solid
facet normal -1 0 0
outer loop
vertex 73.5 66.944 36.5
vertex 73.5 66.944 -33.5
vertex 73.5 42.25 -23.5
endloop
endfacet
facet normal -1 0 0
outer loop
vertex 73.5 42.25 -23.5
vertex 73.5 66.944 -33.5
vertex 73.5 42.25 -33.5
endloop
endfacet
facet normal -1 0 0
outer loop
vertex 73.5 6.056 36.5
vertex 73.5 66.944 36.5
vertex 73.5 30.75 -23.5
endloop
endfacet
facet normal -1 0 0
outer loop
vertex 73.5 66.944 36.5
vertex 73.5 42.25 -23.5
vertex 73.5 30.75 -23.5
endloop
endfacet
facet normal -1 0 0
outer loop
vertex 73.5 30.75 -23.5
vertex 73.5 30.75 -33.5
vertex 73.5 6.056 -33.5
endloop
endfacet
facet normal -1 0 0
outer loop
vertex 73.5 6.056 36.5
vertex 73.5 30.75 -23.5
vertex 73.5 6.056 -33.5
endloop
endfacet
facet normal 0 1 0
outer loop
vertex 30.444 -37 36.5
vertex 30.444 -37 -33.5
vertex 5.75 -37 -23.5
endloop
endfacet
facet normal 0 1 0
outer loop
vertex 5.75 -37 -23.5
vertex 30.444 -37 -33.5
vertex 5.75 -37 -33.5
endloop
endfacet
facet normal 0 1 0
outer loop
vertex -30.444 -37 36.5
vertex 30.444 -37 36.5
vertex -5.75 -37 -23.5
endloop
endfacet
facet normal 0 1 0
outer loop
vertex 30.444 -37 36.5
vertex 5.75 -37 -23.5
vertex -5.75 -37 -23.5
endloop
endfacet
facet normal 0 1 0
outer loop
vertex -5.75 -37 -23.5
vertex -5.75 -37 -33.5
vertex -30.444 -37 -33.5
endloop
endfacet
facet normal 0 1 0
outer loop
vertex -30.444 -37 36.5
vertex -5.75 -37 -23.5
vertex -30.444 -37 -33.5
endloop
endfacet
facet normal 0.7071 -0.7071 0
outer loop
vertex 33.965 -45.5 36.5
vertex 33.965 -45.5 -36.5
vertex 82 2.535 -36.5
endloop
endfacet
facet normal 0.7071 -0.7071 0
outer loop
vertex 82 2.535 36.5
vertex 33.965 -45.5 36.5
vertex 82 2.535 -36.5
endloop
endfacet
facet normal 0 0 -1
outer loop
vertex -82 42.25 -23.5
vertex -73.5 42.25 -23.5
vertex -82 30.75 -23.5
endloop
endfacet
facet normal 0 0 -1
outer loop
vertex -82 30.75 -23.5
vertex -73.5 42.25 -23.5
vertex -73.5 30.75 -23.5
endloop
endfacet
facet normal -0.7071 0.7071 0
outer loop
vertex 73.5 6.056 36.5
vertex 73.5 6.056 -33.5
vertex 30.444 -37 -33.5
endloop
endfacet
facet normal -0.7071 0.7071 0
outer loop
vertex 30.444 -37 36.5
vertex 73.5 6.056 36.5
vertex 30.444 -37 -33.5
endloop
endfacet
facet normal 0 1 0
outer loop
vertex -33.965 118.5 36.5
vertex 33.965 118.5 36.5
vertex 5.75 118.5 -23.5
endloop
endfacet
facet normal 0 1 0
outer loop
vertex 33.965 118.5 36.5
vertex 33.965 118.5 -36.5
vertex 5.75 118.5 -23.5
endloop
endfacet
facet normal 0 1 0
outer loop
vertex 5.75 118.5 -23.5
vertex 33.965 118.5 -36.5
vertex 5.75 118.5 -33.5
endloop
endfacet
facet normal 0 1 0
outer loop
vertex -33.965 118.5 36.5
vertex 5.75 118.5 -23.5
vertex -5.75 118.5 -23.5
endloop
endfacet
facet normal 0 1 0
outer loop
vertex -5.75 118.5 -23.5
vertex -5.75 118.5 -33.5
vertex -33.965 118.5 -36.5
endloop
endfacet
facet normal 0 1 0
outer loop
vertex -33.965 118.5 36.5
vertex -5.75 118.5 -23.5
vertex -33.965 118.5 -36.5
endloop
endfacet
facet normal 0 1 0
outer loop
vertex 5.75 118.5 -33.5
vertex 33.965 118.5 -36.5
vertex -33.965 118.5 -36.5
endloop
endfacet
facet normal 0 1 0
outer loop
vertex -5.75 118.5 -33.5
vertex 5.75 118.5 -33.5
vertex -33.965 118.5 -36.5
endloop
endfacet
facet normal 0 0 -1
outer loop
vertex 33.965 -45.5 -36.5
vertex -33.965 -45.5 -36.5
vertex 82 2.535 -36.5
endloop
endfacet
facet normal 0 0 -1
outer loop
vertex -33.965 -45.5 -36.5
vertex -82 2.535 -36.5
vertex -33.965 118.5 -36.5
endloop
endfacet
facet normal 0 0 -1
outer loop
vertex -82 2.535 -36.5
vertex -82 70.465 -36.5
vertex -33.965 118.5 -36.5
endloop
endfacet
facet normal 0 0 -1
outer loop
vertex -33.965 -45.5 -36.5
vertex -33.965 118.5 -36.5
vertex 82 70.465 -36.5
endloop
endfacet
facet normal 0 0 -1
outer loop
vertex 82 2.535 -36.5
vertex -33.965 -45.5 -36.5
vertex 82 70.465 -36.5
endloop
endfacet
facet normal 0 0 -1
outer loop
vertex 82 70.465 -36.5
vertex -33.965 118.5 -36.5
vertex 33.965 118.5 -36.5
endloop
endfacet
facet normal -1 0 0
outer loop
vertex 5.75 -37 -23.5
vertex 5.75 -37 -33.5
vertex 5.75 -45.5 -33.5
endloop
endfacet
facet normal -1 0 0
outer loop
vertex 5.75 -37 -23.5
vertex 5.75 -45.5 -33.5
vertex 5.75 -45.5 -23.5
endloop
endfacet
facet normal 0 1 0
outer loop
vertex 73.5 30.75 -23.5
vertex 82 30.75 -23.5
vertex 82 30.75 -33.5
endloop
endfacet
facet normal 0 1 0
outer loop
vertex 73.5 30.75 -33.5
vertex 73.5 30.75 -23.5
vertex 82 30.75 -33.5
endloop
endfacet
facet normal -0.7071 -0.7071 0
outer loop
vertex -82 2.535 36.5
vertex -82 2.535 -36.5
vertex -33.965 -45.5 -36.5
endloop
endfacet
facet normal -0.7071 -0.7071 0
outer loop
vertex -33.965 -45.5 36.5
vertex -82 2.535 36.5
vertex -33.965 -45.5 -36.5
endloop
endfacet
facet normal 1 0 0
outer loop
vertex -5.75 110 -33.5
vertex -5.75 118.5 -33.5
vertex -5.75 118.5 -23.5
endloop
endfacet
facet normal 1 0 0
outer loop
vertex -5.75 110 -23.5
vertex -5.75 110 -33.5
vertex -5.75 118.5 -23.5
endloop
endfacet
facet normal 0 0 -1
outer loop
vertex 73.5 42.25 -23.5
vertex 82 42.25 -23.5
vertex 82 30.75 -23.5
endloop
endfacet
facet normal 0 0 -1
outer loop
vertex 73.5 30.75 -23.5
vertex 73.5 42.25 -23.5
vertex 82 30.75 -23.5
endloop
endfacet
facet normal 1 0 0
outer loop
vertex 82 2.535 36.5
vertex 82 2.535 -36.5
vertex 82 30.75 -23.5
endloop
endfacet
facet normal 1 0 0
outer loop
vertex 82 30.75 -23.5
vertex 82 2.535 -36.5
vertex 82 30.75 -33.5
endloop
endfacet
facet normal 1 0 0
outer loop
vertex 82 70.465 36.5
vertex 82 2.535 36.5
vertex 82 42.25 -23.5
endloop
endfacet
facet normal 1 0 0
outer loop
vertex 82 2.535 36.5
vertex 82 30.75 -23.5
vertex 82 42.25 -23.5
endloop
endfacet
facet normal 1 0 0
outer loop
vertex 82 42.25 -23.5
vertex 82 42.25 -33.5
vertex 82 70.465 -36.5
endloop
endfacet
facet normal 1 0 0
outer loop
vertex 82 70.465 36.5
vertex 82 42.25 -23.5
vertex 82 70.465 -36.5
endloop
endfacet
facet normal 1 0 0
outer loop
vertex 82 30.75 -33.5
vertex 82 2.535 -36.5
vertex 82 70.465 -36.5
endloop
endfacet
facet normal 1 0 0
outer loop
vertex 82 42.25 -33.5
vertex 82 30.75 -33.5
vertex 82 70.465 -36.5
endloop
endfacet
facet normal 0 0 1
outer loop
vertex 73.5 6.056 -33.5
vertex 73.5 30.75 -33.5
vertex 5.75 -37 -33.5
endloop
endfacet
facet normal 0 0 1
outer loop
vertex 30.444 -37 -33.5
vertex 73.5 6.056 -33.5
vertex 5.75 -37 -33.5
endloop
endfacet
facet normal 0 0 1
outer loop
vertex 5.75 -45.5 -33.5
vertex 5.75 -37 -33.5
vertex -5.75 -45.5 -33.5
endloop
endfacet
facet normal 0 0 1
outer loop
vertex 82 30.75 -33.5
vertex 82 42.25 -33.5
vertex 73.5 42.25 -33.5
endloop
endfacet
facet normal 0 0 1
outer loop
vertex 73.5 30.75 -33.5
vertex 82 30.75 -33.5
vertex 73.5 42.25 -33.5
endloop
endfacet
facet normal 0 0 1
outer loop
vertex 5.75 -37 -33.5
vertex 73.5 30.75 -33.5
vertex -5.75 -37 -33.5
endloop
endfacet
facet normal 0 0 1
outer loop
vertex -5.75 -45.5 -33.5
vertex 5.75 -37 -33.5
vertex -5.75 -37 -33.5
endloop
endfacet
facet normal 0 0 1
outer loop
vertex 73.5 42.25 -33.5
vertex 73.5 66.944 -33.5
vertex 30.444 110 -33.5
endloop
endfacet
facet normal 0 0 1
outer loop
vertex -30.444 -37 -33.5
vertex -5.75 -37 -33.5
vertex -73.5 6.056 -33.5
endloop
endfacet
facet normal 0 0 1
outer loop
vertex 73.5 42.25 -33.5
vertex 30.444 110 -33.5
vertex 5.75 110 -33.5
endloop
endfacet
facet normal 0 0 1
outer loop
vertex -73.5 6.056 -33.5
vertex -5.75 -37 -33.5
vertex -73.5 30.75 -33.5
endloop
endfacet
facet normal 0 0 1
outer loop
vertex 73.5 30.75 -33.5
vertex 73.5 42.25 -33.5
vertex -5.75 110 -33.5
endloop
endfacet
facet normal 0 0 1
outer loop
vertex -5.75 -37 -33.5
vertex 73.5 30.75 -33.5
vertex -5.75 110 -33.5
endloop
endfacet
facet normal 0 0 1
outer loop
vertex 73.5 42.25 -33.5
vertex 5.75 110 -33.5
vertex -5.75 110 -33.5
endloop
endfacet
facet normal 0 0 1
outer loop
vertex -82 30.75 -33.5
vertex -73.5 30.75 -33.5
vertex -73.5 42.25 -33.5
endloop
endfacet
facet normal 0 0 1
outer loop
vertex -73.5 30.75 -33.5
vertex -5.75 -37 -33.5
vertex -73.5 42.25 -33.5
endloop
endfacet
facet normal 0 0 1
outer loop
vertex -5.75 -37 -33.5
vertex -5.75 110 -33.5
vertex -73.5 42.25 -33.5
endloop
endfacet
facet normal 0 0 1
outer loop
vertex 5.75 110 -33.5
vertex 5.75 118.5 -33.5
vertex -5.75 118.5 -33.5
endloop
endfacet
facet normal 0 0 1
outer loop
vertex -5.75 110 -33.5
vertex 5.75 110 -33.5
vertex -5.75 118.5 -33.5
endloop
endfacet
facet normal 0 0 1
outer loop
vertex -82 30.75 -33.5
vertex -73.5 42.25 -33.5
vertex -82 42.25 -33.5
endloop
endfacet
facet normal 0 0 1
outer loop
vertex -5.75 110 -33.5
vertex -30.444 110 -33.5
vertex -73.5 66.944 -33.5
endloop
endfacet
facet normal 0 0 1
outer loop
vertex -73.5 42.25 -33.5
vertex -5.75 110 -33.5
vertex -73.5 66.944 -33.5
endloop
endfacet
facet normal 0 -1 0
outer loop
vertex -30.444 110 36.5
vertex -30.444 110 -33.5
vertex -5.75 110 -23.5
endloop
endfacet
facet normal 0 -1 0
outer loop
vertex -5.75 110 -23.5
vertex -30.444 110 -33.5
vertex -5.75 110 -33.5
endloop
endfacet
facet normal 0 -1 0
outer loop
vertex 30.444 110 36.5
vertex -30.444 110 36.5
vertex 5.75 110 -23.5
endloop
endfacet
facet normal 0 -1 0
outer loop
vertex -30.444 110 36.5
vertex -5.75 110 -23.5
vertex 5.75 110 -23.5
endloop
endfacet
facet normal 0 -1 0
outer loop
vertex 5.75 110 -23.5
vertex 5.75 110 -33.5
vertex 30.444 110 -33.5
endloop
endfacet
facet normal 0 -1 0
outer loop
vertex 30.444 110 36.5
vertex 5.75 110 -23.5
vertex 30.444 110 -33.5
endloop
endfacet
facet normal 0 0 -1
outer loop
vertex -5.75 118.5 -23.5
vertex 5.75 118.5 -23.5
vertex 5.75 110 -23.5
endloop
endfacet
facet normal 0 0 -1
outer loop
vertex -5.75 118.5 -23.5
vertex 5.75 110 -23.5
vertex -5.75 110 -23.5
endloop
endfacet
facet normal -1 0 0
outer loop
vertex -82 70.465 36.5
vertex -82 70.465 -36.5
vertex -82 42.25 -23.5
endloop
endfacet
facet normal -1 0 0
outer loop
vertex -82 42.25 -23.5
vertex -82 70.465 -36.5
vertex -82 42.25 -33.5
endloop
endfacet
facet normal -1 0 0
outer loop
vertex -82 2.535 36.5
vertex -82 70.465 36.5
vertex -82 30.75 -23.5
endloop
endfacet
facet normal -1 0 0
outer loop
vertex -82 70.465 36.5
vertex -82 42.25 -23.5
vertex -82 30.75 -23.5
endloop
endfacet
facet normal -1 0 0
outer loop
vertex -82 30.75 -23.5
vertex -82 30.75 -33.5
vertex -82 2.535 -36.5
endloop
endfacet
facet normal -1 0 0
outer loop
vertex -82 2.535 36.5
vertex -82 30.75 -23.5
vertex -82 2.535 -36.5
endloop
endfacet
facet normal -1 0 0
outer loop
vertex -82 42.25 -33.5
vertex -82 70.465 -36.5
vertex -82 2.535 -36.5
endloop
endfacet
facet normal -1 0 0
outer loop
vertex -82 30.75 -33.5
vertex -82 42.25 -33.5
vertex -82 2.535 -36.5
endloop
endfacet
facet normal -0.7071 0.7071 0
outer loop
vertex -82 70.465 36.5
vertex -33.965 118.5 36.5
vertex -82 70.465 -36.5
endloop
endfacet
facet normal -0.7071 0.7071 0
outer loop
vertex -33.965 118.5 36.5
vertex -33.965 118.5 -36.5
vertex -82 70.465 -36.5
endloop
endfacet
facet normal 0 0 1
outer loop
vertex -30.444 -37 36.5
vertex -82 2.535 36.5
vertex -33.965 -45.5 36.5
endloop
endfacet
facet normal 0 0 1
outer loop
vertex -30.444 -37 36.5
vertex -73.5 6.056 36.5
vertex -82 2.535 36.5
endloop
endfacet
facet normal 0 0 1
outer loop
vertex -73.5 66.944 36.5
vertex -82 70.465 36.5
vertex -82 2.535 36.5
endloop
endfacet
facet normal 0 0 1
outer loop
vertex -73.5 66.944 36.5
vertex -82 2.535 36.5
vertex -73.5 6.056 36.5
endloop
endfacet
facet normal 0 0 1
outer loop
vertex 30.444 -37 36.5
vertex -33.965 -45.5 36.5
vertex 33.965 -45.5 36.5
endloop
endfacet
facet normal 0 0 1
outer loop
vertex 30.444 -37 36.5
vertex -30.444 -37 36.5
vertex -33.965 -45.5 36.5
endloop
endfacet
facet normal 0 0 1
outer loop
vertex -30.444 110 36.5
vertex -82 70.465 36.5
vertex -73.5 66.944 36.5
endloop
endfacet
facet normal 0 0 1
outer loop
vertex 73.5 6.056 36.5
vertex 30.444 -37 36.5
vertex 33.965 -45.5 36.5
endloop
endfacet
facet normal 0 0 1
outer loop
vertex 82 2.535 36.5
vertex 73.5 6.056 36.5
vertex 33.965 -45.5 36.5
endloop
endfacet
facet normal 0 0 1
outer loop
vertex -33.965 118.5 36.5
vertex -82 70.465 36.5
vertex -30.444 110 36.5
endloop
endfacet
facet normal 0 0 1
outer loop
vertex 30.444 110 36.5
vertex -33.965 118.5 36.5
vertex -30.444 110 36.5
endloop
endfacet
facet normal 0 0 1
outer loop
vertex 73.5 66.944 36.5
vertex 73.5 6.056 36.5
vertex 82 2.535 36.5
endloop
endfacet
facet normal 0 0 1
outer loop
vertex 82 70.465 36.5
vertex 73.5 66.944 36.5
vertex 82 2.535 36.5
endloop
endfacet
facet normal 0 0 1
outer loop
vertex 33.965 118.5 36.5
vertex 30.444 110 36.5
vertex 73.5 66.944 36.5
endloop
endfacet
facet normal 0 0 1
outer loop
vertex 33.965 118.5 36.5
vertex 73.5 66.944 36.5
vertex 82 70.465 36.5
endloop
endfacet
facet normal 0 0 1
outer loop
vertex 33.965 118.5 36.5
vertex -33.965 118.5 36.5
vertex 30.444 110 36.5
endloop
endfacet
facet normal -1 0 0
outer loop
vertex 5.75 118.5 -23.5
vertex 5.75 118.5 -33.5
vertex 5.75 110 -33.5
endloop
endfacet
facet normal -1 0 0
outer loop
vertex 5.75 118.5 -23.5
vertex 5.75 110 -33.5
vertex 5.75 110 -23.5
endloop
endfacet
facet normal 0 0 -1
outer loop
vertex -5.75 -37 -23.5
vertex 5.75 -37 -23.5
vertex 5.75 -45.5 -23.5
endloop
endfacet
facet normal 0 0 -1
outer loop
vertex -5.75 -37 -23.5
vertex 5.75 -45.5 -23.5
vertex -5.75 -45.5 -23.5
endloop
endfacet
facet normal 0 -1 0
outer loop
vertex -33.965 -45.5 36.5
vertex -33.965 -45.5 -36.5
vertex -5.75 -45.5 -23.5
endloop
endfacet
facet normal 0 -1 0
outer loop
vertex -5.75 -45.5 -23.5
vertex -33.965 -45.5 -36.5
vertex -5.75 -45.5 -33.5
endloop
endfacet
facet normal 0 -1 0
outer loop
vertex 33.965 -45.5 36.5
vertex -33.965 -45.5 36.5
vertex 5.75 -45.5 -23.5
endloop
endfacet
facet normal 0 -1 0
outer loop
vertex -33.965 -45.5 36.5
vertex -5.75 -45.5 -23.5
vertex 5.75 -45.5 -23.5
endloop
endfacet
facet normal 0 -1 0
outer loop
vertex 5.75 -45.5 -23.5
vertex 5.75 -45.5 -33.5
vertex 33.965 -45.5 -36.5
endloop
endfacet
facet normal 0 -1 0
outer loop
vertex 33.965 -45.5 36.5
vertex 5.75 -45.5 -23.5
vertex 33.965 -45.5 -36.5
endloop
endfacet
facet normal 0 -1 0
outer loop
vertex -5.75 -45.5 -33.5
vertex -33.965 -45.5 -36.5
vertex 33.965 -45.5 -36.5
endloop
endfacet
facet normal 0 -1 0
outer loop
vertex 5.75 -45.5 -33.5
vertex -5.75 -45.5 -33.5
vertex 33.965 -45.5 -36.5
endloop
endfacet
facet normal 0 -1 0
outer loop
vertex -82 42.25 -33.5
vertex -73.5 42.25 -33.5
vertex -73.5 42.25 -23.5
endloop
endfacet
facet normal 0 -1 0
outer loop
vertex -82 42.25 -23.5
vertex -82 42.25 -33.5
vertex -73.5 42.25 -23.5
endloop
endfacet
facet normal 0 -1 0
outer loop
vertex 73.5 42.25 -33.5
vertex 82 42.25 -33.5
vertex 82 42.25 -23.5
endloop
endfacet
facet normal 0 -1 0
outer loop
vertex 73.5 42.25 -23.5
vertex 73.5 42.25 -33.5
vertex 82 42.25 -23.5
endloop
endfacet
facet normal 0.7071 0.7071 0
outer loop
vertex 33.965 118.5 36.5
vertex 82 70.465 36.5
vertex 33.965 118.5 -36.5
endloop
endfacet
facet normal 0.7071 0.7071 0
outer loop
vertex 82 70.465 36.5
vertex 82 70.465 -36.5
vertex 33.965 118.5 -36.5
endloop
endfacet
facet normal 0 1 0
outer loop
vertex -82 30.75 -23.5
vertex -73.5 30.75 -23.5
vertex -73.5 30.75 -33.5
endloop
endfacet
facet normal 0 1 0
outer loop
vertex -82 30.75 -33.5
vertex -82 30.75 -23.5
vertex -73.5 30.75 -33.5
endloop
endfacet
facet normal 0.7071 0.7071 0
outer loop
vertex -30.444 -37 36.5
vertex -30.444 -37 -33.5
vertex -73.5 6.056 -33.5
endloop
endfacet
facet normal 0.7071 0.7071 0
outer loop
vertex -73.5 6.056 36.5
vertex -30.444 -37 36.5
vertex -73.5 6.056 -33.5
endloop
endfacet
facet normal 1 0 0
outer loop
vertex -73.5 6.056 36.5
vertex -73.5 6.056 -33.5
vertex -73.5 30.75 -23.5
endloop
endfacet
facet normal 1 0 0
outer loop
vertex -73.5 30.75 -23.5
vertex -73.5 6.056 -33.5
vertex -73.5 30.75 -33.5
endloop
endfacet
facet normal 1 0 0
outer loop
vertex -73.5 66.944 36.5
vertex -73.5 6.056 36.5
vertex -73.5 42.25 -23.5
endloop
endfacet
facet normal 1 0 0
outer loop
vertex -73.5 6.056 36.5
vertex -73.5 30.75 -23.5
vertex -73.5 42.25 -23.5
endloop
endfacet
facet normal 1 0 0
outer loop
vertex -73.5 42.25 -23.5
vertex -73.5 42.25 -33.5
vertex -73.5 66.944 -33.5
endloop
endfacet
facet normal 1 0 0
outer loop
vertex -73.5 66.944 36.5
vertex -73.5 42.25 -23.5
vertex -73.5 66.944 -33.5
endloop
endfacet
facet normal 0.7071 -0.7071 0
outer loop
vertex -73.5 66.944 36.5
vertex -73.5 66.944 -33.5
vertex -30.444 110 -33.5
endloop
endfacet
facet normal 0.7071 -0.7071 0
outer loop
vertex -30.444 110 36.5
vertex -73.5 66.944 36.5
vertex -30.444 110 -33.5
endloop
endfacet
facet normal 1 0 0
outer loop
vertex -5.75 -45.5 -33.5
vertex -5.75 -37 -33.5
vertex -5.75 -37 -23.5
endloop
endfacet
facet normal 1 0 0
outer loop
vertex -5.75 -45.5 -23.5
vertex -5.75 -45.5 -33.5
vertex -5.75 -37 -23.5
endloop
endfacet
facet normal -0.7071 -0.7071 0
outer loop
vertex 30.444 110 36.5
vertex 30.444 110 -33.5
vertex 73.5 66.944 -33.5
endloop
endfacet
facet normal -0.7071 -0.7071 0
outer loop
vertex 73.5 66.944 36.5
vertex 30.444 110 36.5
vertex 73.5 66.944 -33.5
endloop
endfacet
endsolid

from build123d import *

# Parameters (mm, degrees)
BOSS_EXTRUDE1_DEPTH   = 3
BOSS_EXTRUDE2_DEPTH   = 70
CUT_EXTRUDE1_DEPTH    = 170
SKETCH4_W             = 11.5
SKETCH4_H             = 10
CUT_EXTRUDE2_DEPTH    = 170
BODY_MOVE_COPY2_ANGLE = 90


with BuildPart() as part:
    # Sketch1 → Boss-Extrude1 (new body)
    with BuildSketch(Plane(origin=(0, 0, 0), x_dir=(1, 0, 0), z_dir=(0, 1, 0))):
        Polygon((0, -82), (0, 0), (-82, 0), (-82, -33.965), (-33.964997557, -82), align=None)
        Polygon((82, 0), (0, 0), (0, -82), (33.965002443, -82), (82, -33.965), align=None)
        Polygon((-82, 0), (0, 0), (82, 0), (82, 33.965), (33.965002443, 82), (-33.964997557, 82), (-82, 33.965), align=None)
    extrude(amount=BOSS_EXTRUDE1_DEPTH)

    # Sketch2 → Boss-Extrude2 (add)
    with BuildSketch(Plane(origin=(0, 3, 0), x_dir=(1, 0, 0), z_dir=(0, 1, 0))):
        Polygon((33.965002443, -82), (82, -33.965), (82, 33.965), (33.965002443, 82), (-33.964997557, 82), (-82, 33.965), (-82, -33.965), (-33.964997557, -82), align=None)
        Polygon((-30.44418472, 73.5), (30.44418472, 73.5), (73.5, 30.44418472), (73.5, -30.44418472), (30.44418472, -73.5), (-30.44418472, -73.5), (-73.5, -30.44418472), (-73.5, 30.44418472), align=None, mode=Mode.SUBTRACT)
    extrude(amount=BOSS_EXTRUDE2_DEPTH)

    # Sketch3 → Cut-Extrude1 (cut)
    with BuildSketch(Plane(origin=(82, 0, 0), x_dir=(0, 0, -1), z_dir=(1, 0, 0))):
        Polygon((-5.75, 13), (-5.75, 3), (0, 3), (5.75, 3), (5.75, 13), align=None)
    extrude(amount=-CUT_EXTRUDE1_DEPTH, mode=Mode.SUBTRACT)

    # Sketch4 → Cut-Extrude2 (cut)
    with BuildSketch(Plane(origin=(0, 0, -82), x_dir=(-1, 0, 0), z_dir=(0, 0, -1))):
        with Locations((0, 8)):
            Rectangle(SKETCH4_W, SKETCH4_H)
    extrude(amount=-CUT_EXTRUDE2_DEPTH, mode=Mode.SUBTRACT)


with BuildPart() as part_1:
    # Body-Move/Copy2: moved
    add(part.part.rotate(Axis((0, 36.5, 0), (1, 0, 0)), BODY_MOVE_COPY2_ANGLE))


solid = part_1.part
